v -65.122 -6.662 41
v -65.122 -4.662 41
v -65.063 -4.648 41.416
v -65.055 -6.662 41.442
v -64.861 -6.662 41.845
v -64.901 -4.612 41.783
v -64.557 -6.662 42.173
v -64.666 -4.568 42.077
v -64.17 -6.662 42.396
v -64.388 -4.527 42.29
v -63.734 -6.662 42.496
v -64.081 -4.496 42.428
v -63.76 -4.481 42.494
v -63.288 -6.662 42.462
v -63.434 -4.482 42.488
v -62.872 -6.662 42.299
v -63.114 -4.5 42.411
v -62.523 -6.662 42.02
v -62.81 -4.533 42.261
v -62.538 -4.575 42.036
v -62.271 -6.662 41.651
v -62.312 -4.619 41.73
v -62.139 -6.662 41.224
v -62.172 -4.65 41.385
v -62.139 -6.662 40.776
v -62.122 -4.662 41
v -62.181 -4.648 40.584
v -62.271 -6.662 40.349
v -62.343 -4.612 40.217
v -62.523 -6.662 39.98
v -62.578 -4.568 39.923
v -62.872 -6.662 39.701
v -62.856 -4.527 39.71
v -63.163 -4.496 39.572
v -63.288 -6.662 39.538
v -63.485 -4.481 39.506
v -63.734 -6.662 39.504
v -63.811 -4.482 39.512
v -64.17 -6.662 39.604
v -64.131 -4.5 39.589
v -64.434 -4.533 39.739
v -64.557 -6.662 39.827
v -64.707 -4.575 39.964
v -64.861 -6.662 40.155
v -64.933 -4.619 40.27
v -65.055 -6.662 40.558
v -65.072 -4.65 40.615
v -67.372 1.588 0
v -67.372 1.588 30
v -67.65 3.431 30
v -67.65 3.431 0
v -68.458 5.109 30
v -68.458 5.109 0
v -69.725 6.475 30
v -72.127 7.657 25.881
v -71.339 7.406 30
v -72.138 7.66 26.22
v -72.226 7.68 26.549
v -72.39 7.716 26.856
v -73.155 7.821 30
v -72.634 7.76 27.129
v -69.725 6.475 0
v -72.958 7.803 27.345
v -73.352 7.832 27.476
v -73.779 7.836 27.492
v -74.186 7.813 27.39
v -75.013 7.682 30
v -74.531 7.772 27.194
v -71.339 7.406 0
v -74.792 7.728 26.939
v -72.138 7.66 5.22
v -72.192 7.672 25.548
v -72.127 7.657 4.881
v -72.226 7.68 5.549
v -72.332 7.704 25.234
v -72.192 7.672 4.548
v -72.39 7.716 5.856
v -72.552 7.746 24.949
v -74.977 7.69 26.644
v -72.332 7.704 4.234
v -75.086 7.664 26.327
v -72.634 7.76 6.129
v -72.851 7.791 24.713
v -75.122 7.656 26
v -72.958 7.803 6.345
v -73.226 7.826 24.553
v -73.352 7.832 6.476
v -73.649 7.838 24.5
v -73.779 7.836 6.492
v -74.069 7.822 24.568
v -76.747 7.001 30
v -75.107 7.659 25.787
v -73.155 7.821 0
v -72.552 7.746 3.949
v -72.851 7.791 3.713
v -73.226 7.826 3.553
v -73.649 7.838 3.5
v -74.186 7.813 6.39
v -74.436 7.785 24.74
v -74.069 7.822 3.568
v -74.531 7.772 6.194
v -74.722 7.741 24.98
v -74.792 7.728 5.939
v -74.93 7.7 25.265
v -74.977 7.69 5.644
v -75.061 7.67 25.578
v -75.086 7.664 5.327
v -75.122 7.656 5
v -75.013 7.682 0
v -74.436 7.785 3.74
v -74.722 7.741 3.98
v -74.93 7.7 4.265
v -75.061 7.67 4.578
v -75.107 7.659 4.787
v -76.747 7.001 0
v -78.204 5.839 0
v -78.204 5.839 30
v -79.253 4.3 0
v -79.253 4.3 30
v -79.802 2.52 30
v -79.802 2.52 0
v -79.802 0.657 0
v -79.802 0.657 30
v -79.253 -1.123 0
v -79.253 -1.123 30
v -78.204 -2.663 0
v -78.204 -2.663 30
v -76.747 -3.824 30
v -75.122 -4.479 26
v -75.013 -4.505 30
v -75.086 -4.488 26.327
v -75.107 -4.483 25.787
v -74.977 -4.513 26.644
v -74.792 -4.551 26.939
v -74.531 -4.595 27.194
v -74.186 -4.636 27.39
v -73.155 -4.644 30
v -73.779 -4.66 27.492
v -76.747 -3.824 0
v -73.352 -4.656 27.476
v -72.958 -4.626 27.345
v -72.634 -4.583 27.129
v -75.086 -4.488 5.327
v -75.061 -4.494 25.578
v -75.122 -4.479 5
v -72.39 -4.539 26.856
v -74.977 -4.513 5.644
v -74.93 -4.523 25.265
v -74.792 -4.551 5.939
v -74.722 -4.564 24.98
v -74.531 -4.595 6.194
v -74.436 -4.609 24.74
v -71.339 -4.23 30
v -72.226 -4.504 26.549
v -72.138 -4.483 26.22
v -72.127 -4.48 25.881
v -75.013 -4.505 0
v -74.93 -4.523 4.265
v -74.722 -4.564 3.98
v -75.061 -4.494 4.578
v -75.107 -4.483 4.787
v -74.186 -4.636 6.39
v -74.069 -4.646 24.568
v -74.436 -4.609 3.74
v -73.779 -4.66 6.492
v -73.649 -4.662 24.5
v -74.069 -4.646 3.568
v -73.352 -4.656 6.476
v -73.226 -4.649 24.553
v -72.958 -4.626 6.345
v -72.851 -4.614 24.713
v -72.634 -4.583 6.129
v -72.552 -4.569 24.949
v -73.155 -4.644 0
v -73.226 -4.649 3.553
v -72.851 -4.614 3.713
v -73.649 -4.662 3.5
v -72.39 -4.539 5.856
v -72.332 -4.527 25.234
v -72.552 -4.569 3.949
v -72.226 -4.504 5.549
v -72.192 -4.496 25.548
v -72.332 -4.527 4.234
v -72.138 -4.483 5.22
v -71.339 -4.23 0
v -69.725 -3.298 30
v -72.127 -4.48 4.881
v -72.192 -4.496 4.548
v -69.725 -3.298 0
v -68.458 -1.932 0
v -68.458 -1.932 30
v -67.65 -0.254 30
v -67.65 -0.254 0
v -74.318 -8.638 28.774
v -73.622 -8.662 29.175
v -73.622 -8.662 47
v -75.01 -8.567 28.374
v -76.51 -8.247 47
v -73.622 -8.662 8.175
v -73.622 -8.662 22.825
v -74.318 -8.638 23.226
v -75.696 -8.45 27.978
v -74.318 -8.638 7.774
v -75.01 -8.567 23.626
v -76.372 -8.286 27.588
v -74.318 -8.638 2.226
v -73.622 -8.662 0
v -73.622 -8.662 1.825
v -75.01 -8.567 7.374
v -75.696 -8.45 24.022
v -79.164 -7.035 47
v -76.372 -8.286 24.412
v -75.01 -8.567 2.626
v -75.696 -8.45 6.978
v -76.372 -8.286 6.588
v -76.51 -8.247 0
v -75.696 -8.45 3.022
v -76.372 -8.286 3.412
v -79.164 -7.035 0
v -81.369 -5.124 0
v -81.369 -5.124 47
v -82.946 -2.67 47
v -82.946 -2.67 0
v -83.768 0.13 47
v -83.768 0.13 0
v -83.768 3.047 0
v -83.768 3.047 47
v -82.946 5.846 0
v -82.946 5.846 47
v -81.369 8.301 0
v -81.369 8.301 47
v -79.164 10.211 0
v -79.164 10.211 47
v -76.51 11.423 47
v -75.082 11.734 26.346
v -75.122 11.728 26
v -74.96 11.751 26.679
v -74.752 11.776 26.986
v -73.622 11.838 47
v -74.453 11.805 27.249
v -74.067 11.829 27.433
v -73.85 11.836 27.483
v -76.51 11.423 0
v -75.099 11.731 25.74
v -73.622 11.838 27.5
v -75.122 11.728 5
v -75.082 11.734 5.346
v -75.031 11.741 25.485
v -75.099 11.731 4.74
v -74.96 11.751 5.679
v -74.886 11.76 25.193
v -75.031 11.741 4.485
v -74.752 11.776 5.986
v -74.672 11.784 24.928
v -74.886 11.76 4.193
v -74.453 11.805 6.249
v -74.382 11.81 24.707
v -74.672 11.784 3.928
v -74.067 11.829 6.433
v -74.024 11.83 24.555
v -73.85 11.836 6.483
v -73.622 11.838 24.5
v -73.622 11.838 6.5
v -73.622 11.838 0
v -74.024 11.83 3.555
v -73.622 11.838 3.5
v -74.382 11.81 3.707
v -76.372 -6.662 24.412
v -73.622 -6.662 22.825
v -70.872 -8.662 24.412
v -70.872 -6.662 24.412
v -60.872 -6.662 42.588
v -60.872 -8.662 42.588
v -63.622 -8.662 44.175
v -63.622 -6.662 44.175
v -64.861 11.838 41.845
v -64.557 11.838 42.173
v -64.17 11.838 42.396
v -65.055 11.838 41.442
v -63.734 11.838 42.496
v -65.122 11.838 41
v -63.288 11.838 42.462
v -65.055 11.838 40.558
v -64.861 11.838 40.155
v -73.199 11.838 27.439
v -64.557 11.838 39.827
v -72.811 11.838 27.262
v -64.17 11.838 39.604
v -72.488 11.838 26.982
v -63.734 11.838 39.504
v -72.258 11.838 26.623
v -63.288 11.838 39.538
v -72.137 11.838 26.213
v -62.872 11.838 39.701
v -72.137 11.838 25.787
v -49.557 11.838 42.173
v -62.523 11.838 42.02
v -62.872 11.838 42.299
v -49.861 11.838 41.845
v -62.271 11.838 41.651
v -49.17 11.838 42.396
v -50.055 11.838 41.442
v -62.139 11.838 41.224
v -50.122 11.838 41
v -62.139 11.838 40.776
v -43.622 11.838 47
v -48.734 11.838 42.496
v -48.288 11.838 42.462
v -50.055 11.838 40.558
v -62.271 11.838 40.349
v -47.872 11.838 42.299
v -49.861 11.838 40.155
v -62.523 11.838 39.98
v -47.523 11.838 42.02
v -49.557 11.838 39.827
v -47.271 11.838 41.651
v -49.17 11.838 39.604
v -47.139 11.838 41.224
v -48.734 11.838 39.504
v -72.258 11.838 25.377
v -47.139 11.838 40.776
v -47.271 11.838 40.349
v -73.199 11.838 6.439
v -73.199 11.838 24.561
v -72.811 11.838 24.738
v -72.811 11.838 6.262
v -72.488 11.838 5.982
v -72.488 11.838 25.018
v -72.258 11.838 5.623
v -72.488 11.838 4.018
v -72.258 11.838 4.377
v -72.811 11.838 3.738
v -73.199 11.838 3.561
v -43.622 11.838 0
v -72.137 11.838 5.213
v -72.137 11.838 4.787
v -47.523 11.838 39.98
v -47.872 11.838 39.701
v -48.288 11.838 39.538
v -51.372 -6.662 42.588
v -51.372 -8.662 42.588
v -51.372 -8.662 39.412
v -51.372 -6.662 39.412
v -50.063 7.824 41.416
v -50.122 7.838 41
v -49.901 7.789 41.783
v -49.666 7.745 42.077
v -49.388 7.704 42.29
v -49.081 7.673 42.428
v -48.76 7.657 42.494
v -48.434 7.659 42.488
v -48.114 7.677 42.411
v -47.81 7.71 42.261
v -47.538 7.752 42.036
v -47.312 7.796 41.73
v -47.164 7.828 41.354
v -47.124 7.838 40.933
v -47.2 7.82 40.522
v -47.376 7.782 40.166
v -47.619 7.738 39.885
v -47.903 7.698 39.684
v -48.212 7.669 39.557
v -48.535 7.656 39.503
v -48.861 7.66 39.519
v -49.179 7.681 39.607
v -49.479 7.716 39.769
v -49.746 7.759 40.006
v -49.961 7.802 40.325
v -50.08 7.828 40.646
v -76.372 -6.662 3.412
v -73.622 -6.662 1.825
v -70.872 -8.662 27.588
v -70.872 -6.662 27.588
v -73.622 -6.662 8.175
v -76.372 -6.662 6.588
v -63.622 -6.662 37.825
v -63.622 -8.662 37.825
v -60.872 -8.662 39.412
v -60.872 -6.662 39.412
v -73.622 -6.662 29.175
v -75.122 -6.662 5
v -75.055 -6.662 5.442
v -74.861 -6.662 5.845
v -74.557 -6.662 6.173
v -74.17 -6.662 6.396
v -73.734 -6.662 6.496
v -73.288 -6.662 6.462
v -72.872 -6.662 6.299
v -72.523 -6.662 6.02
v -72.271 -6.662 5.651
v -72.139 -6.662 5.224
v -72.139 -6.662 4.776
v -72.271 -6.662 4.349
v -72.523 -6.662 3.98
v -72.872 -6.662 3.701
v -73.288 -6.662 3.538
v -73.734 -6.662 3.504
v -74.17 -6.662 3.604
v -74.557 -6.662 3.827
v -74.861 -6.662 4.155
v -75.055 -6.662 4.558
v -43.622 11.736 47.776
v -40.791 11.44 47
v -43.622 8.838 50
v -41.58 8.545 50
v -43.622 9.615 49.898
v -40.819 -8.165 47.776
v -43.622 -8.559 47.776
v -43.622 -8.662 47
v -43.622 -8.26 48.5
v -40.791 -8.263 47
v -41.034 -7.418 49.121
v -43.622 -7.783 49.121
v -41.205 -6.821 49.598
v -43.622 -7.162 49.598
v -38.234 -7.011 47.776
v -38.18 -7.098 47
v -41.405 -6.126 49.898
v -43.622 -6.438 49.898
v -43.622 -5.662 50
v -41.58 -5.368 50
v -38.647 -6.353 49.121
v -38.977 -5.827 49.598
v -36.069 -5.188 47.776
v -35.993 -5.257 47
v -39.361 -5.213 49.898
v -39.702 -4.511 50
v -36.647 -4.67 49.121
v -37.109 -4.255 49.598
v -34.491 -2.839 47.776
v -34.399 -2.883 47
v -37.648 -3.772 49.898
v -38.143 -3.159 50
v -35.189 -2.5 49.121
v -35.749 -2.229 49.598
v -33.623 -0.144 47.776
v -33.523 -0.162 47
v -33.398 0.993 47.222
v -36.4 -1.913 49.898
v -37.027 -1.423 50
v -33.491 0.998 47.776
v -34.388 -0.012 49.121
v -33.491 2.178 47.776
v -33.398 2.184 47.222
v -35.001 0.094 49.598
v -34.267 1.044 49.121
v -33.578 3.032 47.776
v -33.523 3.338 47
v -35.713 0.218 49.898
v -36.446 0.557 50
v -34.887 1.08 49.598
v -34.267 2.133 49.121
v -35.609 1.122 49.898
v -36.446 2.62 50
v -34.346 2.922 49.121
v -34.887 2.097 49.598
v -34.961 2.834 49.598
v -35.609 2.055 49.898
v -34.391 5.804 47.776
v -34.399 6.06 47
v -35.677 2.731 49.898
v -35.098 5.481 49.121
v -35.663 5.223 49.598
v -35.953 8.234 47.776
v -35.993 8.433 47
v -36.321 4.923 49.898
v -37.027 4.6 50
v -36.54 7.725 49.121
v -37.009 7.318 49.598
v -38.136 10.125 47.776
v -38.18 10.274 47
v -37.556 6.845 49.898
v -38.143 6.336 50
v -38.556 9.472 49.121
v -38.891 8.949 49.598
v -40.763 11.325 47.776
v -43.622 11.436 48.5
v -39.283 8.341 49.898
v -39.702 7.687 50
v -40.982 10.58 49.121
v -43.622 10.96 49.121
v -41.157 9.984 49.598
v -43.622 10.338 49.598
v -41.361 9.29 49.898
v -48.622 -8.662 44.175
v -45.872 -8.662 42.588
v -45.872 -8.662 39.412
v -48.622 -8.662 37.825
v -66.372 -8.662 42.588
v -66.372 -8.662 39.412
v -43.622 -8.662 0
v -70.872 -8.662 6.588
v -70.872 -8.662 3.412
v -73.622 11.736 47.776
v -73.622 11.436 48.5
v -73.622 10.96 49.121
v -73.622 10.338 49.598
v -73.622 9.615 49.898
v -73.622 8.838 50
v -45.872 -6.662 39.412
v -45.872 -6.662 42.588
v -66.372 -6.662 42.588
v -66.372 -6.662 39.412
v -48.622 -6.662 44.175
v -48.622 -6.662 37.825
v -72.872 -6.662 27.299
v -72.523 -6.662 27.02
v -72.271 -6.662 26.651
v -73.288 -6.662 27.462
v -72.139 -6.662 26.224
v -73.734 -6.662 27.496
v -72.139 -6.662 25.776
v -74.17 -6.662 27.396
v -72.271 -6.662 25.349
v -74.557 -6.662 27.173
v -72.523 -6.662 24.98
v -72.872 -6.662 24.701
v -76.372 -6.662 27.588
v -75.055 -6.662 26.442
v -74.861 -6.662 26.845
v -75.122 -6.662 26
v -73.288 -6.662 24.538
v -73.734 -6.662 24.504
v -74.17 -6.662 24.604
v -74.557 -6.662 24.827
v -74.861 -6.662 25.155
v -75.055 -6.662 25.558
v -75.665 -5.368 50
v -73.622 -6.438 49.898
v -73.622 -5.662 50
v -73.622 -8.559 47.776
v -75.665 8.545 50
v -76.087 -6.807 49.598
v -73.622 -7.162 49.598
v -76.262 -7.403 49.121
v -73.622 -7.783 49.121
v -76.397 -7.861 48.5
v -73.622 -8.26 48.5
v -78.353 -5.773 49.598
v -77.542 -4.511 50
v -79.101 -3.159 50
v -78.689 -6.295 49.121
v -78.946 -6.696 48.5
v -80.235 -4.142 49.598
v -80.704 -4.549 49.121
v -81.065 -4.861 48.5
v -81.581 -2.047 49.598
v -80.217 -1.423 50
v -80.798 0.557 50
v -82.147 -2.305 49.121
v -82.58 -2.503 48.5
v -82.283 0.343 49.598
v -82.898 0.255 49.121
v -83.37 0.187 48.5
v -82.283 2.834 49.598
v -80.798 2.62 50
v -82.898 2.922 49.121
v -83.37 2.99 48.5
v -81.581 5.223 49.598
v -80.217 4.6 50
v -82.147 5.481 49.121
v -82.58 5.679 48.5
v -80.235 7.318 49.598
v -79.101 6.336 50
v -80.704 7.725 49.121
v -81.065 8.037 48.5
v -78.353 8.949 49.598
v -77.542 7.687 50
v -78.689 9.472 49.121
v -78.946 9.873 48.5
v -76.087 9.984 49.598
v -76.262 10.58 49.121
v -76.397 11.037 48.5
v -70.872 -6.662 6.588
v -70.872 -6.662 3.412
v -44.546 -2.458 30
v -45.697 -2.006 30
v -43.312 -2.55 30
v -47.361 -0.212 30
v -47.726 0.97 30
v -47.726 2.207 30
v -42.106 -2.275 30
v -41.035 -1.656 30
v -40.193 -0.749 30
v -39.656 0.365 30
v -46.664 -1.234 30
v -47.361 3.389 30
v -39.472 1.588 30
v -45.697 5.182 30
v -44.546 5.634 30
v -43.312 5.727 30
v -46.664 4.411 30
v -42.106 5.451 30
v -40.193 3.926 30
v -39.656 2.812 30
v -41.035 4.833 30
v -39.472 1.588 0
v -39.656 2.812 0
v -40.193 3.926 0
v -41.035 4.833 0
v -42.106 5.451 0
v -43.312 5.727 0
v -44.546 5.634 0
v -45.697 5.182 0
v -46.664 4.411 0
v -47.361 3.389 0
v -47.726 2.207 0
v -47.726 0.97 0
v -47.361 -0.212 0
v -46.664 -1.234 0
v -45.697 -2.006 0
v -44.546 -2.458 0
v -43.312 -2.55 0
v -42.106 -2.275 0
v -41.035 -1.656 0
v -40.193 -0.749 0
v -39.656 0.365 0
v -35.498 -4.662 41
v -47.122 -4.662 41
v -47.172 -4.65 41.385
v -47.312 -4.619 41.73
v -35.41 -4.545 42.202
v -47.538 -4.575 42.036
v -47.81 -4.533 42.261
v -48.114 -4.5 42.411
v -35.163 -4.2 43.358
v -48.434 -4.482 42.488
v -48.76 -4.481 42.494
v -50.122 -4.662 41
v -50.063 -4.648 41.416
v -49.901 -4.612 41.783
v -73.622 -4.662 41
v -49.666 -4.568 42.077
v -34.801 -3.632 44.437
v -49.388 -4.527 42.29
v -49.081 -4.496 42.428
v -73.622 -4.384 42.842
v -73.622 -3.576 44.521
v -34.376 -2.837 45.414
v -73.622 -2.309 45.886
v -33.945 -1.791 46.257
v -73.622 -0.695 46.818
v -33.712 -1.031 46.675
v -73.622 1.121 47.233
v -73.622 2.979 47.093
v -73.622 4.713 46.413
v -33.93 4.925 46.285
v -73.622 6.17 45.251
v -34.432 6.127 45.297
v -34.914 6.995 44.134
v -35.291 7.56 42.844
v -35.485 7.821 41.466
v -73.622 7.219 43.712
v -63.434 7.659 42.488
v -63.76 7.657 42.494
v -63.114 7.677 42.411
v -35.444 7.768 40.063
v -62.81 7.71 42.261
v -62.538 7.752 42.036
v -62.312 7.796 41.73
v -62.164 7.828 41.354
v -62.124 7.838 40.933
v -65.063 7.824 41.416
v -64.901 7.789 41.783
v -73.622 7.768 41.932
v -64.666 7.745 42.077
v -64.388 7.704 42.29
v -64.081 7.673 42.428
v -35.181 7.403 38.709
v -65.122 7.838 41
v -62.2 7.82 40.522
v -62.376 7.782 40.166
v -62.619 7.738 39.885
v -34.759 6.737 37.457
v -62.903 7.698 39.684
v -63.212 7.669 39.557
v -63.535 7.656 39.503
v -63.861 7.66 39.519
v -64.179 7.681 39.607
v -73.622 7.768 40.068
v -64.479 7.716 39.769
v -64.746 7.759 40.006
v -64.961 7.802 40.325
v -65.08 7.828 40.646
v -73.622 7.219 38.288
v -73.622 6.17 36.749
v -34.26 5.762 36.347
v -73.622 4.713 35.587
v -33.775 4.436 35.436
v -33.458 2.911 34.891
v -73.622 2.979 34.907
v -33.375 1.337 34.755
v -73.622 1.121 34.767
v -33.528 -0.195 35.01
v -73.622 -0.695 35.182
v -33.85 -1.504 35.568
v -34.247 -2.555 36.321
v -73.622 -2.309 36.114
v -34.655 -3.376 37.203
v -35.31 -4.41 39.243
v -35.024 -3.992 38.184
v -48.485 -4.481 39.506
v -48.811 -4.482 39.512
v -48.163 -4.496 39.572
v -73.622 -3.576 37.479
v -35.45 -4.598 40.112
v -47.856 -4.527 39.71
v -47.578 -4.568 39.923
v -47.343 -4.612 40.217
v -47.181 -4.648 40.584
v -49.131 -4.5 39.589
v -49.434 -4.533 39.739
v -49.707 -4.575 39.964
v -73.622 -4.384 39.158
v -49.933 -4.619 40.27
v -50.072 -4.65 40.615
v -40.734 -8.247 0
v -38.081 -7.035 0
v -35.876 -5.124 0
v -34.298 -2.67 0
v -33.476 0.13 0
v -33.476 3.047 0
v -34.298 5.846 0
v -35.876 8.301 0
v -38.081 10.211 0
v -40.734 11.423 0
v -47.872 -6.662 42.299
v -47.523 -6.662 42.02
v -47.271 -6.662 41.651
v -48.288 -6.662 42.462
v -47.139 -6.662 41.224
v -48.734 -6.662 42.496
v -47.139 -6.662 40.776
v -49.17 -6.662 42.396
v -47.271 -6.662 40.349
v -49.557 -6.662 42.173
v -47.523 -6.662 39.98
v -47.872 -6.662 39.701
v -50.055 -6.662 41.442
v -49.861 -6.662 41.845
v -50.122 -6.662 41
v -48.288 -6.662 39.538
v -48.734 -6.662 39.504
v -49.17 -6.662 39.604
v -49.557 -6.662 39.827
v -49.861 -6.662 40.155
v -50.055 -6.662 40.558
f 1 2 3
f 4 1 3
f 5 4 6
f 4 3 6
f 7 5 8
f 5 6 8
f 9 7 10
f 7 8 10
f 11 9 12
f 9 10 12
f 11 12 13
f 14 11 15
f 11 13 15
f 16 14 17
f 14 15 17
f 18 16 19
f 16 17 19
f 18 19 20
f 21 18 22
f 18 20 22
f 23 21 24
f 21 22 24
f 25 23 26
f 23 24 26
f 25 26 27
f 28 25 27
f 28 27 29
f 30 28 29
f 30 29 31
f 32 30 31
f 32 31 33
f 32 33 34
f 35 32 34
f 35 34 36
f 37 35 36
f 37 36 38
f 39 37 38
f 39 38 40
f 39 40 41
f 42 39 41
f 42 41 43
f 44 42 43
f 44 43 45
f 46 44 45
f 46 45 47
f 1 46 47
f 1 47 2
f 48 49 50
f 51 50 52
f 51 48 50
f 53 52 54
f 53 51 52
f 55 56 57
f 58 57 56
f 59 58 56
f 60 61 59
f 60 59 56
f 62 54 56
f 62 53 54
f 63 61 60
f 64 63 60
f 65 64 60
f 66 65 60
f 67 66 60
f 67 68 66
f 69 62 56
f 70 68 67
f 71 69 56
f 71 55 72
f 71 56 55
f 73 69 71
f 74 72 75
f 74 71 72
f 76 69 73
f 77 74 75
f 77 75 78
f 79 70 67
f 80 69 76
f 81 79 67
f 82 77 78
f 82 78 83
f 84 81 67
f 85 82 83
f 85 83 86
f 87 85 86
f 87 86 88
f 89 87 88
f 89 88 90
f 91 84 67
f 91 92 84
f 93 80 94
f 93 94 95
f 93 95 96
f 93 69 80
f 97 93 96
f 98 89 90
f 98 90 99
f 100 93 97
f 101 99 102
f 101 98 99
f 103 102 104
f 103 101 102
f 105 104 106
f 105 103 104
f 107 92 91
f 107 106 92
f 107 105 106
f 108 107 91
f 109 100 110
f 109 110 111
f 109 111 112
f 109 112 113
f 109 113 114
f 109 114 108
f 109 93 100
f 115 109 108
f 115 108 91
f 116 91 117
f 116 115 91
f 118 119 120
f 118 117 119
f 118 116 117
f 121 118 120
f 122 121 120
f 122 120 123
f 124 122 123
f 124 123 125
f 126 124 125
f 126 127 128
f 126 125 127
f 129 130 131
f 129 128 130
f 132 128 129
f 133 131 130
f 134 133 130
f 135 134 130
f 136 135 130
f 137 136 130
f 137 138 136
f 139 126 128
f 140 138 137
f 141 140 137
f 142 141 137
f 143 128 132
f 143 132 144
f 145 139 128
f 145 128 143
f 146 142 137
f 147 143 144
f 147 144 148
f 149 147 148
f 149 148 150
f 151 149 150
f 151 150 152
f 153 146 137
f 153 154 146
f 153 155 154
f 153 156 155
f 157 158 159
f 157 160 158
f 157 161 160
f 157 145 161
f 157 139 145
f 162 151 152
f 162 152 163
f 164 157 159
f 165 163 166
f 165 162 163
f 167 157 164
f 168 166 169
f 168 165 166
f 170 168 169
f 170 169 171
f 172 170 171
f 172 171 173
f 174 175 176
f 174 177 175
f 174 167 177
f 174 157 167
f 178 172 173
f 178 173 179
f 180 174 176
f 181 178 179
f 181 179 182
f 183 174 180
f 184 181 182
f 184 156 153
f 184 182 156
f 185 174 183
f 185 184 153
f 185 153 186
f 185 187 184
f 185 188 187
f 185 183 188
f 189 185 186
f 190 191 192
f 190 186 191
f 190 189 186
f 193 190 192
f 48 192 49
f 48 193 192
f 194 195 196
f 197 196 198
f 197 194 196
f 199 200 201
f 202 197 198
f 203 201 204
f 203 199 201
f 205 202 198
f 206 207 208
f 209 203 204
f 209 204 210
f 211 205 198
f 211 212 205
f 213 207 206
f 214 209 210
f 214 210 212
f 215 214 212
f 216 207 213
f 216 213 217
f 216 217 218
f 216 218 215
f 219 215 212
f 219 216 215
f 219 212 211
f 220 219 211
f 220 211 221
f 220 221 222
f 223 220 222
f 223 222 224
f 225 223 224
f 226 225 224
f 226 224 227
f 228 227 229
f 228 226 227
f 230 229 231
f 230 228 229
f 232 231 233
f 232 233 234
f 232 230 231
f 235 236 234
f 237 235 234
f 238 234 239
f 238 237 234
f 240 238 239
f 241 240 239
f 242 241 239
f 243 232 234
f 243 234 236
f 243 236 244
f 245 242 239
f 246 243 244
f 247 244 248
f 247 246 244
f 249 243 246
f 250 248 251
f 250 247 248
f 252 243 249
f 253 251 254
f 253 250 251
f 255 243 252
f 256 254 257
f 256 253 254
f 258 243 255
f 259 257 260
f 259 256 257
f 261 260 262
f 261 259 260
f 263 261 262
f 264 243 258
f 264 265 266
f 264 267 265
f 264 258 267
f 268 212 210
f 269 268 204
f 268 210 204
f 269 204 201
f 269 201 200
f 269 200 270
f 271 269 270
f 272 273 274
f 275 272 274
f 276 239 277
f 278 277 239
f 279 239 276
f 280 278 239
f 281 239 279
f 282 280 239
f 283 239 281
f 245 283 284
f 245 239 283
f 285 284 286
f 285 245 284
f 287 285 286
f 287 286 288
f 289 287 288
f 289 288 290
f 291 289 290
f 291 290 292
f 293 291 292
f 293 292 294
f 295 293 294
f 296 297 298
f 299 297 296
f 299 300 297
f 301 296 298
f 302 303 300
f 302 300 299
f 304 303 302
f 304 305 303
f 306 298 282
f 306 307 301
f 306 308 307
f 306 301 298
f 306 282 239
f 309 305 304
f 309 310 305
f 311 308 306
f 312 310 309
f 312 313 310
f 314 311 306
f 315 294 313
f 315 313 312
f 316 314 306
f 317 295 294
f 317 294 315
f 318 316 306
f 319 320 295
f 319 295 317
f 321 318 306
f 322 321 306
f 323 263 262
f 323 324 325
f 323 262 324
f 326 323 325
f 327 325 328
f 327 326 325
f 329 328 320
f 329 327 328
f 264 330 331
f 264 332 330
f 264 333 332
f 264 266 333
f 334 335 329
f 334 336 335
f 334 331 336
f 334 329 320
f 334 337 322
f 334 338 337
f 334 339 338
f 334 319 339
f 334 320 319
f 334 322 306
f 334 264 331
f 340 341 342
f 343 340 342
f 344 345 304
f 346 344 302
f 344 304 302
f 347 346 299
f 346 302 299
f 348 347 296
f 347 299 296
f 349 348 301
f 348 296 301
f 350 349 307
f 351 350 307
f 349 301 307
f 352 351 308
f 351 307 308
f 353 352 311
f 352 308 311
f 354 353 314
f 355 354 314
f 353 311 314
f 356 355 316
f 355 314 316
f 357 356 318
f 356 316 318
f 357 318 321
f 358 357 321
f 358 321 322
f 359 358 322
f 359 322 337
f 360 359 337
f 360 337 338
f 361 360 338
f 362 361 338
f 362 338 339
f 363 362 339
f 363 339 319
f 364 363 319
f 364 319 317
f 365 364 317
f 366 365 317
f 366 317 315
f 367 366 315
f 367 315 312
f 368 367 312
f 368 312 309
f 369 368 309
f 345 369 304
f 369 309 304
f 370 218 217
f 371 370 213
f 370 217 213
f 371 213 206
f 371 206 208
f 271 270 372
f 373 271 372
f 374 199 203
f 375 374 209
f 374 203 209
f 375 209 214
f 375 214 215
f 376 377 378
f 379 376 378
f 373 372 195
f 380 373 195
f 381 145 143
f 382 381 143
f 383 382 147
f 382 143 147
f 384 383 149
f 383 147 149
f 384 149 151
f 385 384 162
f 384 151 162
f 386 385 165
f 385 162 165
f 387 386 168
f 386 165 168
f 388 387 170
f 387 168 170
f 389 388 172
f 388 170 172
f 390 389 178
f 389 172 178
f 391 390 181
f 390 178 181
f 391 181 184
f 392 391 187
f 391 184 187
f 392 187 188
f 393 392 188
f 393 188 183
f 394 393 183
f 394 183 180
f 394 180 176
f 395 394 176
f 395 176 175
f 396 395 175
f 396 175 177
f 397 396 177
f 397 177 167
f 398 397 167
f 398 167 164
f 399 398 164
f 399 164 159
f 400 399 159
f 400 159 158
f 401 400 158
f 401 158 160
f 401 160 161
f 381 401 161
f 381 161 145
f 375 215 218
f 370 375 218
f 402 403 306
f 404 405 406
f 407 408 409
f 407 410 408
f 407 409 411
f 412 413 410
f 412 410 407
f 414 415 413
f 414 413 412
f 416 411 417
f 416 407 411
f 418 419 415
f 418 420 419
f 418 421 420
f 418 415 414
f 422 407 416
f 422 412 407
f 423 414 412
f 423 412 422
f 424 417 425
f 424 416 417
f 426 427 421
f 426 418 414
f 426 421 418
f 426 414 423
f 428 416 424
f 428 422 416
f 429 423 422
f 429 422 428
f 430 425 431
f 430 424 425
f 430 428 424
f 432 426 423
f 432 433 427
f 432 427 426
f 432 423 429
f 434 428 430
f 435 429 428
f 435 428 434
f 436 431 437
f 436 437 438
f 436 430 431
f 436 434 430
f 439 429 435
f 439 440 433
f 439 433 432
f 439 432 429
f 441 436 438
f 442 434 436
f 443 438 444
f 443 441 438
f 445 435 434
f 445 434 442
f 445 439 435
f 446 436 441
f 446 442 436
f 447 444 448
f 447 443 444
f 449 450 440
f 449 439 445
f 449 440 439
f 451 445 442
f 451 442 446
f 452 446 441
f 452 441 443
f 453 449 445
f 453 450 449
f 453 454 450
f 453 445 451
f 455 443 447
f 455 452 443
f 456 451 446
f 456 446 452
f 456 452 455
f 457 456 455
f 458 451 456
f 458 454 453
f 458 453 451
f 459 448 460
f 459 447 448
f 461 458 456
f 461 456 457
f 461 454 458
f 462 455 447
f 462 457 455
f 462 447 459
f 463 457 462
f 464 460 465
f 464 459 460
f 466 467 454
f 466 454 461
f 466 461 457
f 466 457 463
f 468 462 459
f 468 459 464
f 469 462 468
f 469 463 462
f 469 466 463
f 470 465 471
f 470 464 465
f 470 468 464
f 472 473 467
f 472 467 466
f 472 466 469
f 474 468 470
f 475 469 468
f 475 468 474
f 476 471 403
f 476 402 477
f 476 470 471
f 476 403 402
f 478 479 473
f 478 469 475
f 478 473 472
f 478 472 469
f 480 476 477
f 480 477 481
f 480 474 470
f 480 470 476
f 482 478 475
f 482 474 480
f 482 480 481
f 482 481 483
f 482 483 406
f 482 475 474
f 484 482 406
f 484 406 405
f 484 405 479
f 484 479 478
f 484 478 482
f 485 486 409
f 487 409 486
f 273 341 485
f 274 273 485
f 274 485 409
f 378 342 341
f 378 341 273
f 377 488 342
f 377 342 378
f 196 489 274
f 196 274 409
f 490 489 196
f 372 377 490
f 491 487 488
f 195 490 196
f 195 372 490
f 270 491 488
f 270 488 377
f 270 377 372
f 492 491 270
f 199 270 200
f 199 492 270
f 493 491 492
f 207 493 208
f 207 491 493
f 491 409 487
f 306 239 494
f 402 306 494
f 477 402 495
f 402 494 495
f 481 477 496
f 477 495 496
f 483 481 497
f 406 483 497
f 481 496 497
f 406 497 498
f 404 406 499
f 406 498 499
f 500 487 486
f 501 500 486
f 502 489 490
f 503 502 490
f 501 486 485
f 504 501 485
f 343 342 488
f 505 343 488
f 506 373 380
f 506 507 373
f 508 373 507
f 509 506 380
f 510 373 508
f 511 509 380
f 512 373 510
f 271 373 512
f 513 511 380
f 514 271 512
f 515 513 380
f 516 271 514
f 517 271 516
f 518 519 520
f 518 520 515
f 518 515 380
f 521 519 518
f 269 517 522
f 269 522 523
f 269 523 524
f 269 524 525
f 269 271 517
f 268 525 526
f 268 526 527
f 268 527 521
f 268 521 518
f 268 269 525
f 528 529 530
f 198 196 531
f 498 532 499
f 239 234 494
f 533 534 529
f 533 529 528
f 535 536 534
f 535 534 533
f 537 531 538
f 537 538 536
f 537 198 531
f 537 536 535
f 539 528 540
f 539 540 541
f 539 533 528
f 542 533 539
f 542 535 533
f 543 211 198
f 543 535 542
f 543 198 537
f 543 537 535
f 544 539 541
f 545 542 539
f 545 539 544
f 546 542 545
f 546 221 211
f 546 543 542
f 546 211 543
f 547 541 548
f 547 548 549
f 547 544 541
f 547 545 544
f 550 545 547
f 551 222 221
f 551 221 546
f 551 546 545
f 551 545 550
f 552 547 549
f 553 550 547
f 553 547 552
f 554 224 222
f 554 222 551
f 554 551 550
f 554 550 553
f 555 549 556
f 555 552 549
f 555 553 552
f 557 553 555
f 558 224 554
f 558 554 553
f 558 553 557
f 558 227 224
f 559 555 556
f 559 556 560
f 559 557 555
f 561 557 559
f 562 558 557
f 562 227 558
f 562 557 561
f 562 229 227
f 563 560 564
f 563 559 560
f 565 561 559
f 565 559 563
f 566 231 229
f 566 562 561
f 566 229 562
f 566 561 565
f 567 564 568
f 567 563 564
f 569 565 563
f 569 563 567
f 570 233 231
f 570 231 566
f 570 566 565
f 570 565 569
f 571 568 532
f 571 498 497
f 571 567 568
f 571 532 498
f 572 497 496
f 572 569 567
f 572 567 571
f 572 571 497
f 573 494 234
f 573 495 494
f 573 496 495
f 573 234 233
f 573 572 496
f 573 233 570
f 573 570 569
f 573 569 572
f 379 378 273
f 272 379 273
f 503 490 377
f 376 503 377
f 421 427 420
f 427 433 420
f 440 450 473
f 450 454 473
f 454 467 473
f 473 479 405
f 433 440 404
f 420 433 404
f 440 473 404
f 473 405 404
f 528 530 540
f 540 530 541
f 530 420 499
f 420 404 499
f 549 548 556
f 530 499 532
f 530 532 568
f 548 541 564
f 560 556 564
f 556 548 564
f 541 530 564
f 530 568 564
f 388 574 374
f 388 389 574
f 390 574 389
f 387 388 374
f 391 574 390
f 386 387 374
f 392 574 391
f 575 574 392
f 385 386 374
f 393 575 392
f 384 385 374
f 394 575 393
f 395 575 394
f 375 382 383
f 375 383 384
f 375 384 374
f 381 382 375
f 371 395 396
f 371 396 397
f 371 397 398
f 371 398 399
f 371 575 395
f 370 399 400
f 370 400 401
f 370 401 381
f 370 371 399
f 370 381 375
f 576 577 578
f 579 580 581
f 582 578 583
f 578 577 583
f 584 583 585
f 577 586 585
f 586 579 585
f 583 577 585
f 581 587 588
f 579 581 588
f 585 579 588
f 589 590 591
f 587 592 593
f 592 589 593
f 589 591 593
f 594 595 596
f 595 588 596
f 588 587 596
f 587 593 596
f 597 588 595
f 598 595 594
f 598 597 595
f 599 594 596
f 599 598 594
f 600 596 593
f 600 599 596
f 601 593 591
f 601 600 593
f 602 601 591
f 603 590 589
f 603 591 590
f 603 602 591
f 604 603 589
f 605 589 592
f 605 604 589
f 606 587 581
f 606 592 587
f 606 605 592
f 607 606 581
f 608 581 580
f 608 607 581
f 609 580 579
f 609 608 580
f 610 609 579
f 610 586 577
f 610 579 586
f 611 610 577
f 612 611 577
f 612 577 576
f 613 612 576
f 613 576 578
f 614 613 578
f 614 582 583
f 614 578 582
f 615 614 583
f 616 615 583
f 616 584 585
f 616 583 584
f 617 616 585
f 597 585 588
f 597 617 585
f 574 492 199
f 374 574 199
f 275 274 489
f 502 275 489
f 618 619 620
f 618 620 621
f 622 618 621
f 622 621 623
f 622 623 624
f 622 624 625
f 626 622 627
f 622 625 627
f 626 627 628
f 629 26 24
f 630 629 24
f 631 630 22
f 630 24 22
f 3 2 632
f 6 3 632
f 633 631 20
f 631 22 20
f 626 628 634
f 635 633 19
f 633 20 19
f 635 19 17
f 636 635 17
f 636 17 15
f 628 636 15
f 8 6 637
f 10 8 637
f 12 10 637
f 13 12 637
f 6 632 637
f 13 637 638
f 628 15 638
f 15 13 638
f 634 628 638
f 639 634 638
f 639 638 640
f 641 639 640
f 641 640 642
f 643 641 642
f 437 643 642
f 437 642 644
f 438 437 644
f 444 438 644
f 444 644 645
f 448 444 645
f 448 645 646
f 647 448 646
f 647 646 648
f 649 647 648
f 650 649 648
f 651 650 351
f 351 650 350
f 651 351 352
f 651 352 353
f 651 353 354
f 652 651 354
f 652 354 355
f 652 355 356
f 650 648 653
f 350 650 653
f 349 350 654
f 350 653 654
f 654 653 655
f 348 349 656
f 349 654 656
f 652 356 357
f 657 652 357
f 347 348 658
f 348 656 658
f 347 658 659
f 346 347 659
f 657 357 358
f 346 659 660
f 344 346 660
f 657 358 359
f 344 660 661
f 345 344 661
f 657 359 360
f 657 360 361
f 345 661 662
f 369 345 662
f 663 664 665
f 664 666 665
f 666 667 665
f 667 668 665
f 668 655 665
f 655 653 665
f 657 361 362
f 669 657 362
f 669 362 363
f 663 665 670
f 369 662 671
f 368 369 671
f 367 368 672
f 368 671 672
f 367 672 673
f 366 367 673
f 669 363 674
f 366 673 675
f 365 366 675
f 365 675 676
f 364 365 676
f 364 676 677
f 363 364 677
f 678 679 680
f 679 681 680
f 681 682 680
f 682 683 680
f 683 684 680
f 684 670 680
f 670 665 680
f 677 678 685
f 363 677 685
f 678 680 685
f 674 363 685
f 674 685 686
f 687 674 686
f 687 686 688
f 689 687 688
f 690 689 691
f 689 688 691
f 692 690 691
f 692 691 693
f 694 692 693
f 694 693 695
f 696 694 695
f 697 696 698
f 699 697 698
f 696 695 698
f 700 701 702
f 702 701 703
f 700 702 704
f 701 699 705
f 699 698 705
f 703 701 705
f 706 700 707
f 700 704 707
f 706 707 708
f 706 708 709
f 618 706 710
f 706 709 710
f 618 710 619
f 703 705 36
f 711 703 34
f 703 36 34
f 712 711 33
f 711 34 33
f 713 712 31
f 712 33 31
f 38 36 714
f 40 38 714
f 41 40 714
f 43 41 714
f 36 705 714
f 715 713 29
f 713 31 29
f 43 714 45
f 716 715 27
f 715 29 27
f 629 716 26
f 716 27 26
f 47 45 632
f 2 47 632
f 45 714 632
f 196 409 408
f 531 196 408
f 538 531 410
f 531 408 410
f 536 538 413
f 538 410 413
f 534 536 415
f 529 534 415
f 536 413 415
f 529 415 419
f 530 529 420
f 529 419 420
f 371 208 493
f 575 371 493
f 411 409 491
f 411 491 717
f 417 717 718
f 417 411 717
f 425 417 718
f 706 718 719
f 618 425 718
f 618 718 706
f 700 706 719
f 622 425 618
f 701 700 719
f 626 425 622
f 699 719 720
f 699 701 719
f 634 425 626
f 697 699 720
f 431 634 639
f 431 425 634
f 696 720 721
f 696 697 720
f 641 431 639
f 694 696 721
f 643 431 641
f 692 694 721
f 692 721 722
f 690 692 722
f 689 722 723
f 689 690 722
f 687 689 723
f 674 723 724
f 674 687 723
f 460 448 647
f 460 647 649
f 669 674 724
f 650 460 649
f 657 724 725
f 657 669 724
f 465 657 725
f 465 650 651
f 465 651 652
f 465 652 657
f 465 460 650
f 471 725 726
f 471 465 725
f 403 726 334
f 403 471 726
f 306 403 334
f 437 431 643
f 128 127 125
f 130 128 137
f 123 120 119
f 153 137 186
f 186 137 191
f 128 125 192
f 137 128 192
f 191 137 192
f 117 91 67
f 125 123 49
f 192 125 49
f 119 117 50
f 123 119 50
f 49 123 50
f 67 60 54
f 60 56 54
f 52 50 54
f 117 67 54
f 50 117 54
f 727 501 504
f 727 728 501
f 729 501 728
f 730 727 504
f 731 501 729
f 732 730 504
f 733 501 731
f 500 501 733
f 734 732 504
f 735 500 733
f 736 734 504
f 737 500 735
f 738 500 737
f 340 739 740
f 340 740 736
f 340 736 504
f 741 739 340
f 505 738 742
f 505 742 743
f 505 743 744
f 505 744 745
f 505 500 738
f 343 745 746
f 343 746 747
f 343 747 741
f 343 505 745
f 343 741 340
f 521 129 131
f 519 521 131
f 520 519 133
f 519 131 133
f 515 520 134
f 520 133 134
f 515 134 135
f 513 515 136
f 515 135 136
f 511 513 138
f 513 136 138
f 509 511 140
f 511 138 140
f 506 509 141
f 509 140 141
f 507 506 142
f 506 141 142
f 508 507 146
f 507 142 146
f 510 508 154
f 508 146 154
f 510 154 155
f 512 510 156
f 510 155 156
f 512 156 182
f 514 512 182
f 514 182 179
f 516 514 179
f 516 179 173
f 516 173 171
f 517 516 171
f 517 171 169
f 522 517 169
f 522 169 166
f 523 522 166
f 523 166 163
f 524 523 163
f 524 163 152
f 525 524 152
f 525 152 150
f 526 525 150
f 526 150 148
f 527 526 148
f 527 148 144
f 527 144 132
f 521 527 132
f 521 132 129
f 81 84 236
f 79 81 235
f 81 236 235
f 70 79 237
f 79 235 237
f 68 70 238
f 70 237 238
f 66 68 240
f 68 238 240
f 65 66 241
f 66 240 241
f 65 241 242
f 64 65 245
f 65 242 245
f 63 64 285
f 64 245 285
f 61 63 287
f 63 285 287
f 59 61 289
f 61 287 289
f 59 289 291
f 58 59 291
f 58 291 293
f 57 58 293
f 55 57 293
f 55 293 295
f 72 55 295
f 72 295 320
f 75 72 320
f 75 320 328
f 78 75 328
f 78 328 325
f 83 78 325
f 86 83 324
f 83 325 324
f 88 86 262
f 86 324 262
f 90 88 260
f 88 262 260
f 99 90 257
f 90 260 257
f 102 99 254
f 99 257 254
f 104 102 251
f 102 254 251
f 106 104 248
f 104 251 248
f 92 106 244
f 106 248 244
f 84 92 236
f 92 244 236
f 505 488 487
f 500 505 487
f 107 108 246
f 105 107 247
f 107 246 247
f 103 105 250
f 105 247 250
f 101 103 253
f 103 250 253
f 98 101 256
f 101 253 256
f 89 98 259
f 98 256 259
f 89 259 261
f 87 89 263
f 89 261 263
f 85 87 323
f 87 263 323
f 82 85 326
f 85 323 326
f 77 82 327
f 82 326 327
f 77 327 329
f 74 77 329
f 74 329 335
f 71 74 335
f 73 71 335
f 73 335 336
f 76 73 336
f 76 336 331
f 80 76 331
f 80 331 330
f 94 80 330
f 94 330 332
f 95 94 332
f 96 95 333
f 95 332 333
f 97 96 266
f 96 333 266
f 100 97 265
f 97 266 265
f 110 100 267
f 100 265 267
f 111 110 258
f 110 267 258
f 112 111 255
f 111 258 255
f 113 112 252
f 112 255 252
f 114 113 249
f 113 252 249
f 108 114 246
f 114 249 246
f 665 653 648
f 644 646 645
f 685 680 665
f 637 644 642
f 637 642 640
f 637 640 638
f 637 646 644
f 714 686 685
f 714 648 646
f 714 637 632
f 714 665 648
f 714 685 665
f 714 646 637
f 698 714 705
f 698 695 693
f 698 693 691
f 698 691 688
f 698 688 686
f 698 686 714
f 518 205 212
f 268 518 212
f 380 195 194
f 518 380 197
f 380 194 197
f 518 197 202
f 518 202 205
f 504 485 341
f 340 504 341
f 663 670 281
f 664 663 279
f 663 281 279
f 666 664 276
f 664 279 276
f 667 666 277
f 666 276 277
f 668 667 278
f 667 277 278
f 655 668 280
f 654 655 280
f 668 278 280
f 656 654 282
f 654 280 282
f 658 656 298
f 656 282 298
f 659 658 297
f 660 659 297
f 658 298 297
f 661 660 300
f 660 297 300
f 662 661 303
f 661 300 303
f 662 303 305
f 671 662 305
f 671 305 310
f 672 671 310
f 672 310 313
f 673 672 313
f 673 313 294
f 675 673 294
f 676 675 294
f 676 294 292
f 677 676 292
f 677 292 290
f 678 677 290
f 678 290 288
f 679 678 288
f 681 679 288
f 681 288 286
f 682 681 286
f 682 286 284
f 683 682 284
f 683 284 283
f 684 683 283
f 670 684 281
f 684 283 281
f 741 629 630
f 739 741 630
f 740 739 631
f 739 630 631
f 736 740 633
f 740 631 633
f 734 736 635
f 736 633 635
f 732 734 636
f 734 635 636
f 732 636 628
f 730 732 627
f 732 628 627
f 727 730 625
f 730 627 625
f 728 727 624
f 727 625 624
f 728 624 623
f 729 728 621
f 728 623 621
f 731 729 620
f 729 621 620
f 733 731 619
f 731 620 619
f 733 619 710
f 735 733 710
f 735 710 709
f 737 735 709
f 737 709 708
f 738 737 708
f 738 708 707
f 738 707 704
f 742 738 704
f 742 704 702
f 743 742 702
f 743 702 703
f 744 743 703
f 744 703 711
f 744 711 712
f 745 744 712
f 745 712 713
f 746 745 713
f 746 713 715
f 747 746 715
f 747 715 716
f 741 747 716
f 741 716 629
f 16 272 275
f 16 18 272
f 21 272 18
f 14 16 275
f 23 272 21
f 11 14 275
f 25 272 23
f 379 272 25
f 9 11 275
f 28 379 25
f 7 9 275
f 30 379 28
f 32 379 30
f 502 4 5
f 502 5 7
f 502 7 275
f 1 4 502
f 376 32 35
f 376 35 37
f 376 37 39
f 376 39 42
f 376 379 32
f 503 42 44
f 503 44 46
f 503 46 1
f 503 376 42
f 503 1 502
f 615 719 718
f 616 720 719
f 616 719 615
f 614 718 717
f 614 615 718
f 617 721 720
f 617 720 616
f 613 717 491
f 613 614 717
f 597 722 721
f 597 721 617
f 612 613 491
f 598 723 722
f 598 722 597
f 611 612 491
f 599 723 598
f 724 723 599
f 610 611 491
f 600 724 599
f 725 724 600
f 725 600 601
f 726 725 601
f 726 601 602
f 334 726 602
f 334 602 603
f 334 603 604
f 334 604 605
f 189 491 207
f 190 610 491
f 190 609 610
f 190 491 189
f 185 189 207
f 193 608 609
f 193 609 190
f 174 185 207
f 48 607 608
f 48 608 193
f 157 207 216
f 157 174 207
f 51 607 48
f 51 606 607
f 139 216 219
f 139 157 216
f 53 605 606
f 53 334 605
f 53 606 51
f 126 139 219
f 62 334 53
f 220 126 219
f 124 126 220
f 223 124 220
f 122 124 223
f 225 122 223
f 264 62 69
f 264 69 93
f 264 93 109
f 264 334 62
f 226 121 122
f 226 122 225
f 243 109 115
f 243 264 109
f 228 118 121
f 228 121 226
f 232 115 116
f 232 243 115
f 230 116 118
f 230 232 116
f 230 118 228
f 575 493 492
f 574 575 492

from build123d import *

# Parameters (mm, degrees)
SKETCH1_R           = 6.25
SKETCH1_R_2         = 4.15
BOSS_EXTRUDE1_DEPTH = 50
CUT_EXTRUDE1_DEPTH  = 127
BOSS_EXTRUDE2_DEPTH = 20
SKETCH4_R           = 6.25
CUT_EXTRUDE2_DEPTH  = 20
CUT_EXTRUDE3_START  = -30
SKETCH5_R           = 6.25
CUT_EXTRUDE3_DEPTH  = 30
FILLET1_R           = 3
SKETCH6_R           = 4.5
BOSS_EXTRUDE3_DEPTH = 30
SKETCH7_R           = 1.5
CUT_EXTRUDE4_DEPTH  = 30
CUT_EXTRUDE5_DEPTH  = 2
CUT_EXTRUDE6_START  = -30
SKETCH9_R           = 4.5
CUT_EXTRUDE6_DEPTH  = 30


with BuildPart() as part:
    # Sketch1 → Boss-Extrude1 (new body)
    with BuildSketch(Plane.XY):
        with BuildLine():
            Line((-73.62208004, 11.83829087), (106.37791996, 11.83829087))
            ThreePointArc((106.37791996, 11.83829087), (116.62791996, 1.58829087), (106.37791996, -8.66170913))
            Line((106.37791996, -8.66170913), (-73.62208004, -8.66170913))
            ThreePointArc((-73.62208004, -8.66170913), (-83.87208004, 1.58829087), (-73.62208004, 11.83829087))
        make_face()
        with Locations((-73.62208004, 1.58829087)):
            Circle(SKETCH1_R, mode=Mode.SUBTRACT)
        with Locations((-43.62208004, 1.58829087)):
            Circle(SKETCH1_R_2, mode=Mode.SUBTRACT)
        with Locations(Location((76.37791996, 1.58829087, 0), (0, 0, 180))):
            Circle(SKETCH1_R_2, mode=Mode.SUBTRACT)
        with Locations(Location((106.37791996, 1.58829087, 0), (0, 0, 180))):
            Circle(SKETCH1_R, mode=Mode.SUBTRACT)
    extrude(amount=BOSS_EXTRUDE1_DEPTH)

    # Sketch2 → Cut-Extrude1 (cut)
    with BuildSketch(Plane.XY.offset(50)):
        with BuildLine():
            Line((-43.62208004, 11.83829087), (132.206329773, 11.83829087))
            Line((132.206329773, 11.83829087), (132.206329773, -8.66170913))
            Line((132.206329773, -8.66170913), (-43.62208004, -8.66170913))
            ThreePointArc((-43.62208004, -8.66170913), (-33.37208004, 1.58829087), (-43.62208004, 11.83829087))
        make_face()
    extrude(amount=-CUT_EXTRUDE1_DEPTH, mode=Mode.SUBTRACT)

    # Sketch3 → Boss-Extrude2 (add)
    with BuildSketch(Plane.XY.offset(50)):
        with BuildLine():
            Line((-43.62208004, 11.83829087), (-73.62208004, 11.83829087))
            ThreePointArc((-73.62208004, 11.83829087), (-83.87208004, 1.58829087), (-73.62208004, -8.66170913))
            Line((-73.62208004, -8.66170913), (-43.62208004, -8.66170913))
            ThreePointArc((-43.62208004, -8.66170913), (-33.37208004, 1.58829087), (-43.62208004, 11.83829087))
        make_face()
    extrude(amount=-BOSS_EXTRUDE2_DEPTH)

    # Sketch4 → Cut-Extrude2 (cut)
    with BuildSketch(Plane.ZY.offset(43.62208004)):
        with Locations(Location((41, 1.58829087, 0), (0, 0, 270))):
            Circle(SKETCH4_R)
    extrude(amount=-CUT_EXTRUDE2_DEPTH, mode=Mode.SUBTRACT)

    # Sketch5 → Cut-Extrude3 (cut)
    with BuildSketch(Plane(origin=(-43.62208004, 0, 0), x_dir=(0, 0, -1), z_dir=(1, 0, 0)).offset(CUT_EXTRUDE3_START)):
        with Locations(Location((-41, 1.58829087, 0), (0, 0, 270))):
            Circle(SKETCH5_R)
    extrude(amount=CUT_EXTRUDE3_DEPTH, mode=Mode.SUBTRACT)

    # Fillet1
    # the kernel refuses this fillet: 3 mm, written as the material it takes off along each edge
    with BuildSketch(Plane(origin=(-73.62208004, 11.83829087, 50), x_dir=(0, 0, -1), z_dir=(1, 0, 0)), Plane(origin=(-43.62208004, -8.66170913, 50), x_dir=(0, 0, -1), z_dir=(-1, 0, 0))) as fillet1_piece_1:
        with BuildLine():
            CenterArc((FILLET1_R, -FILLET1_R), FILLET1_R, 90, 90)
            Line((0, -FILLET1_R), (0, 0))
            Line((0, 0), (FILLET1_R, 0))
        make_face()
    extrude(amount=30, mode=Mode.SUBTRACT)
    with BuildSketch(Plane(origin=(-73.62208004, 1.58829087, 50), x_dir=(0, -1, 0), z_dir=(1, 0, 0))) as fillet1_piece_2:
        with BuildLine():
            CenterArc((10.25 - FILLET1_R, FILLET1_R), FILLET1_R, 270, 90)
            Line((10.25, FILLET1_R), (10.25, 0))
            Line((10.25, 0), (10.25 - FILLET1_R, 0))
        make_face()
    revolve(axis=Axis((-73.62208004, 1.58829087, 50), (0, 0, -1)), revolution_arc=180, mode=Mode.SUBTRACT)
    with BuildSketch(Plane(origin=(-43.62208004, 1.58829087, 50), x_dir=(0, -1, 0), z_dir=(-1, 0, 0))) as fillet1_piece_3:
        with BuildLine():
            CenterArc((10.25 - FILLET1_R, -FILLET1_R), FILLET1_R, 0, 90)
            Line((10.25 - FILLET1_R, 0), (10.25, 0))
            Line((10.25, 0), (10.25, -FILLET1_R))
        make_face()
    revolve(axis=Axis((-43.62208004, 1.58829087, 50), (0, 0, 1)), revolution_arc=180, mode=Mode.SUBTRACT)

    # Sketch6 → Boss-Extrude3 (add)
    with BuildSketch(Plane(origin=(0, 0, 30), x_dir=(-1, 0, 0), z_dir=(0, 0, -1))):
        with Locations(Location((73.62208004, 1.58829087, 0), (0, 0, 180))):
            Circle(SKETCH6_R)
    extrude(amount=BOSS_EXTRUDE3_DEPTH)

    # Sketch7 → Cut-Extrude4 (cut)
    with BuildSketch(Plane(origin=(0, 11.83829087, 0), x_dir=(1, 0, 0), z_dir=(0, 1, 0))):
        with Locations(Location((-48.62208004, -41, 0), (0, 0, 180))):
            Circle(SKETCH7_R)
        with Locations(Location((-63.62208004, -41, 0), (0, 0, 180))):
            Circle(SKETCH7_R)
        with Locations(Location((-73.62208004, -26, 0), (0, 0, 180))):
            Circle(SKETCH7_R)
        with Locations(Location((-73.62208004, -5, 0), (0, 0, 180))):
            Circle(SKETCH7_R)
    extrude(amount=-CUT_EXTRUDE4_DEPTH, mode=Mode.SUBTRACT)

    # Sketch8 → Cut-Extrude5 (cut)
    with BuildSketch(Plane(origin=(0, -8.66170913, 0), x_dir=(-1, 0, 0), z_dir=(0, -1, 0))):
        Polygon((73.62208004, -8.175426481), (76.37208004, -6.58771324), (76.37208004, -3.41228676), (73.62208004, -1.824573519), (70.87208004, -3.41228676), (70.87208004, -6.58771324), align=None)
        Polygon((73.62208004, -29.175426481), (76.37208004, -27.58771324), (76.37208004, -24.41228676), (73.62208004, -22.824573519), (70.87208004, -24.41228676), (70.87208004, -27.58771324), align=None)
        Polygon((63.62208004, -44.175426481), (66.37208004, -42.58771324), (66.37208004, -39.41228676), (63.62208004, -37.824573519), (60.87208004, -39.41228676), (60.87208004, -42.58771324), align=None)
        Polygon((48.62208004, -44.175426481), (51.37208004, -42.58771324), (51.37208004, -39.41228676), (48.62208004, -37.824573519), (45.87208004, -39.41228676), (45.87208004, -42.58771324), align=None)
    extrude(amount=-CUT_EXTRUDE5_DEPTH, mode=Mode.SUBTRACT)

    # Sketch9 → Cut-Extrude6 (cut)
    with BuildSketch(Plane(origin=(0, 0, 0), x_dir=(-1, 0, 0), z_dir=(0, 0, -1)).offset(CUT_EXTRUDE6_START)):
        with Locations((73.62208004, 1.58829087)):
            Circle(SKETCH9_R)
    extrude(amount=CUT_EXTRUDE6_DEPTH, mode=Mode.SUBTRACT)


solid = part.part
